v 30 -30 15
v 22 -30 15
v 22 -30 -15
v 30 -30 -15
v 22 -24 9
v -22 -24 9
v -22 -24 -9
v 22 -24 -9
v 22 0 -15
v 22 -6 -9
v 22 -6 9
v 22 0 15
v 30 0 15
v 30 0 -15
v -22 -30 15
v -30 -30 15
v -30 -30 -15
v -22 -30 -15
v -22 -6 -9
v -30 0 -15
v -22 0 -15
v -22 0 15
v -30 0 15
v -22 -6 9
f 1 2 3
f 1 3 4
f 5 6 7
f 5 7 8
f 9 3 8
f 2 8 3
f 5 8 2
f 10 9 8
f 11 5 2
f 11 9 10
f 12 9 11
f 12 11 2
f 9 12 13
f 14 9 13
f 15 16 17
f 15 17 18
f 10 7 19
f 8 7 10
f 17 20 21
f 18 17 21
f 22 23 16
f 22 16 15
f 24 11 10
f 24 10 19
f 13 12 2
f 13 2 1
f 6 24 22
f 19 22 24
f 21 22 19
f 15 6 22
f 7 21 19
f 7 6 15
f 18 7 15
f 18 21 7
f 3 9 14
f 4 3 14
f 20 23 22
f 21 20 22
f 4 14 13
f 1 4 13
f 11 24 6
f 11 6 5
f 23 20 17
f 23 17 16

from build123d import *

# Parameters (mm, degrees)
F0_W     = 60
F0_H     = 30
F1_DEPTH = 30
F2_W     = 44
F2_H     = 30
F3_DEPTH = 6
F4_W     = 44
F4_H     = 24
F5_DEPTH = 6
F6_W     = 44
F6_H     = 24
F7_DEPTH = 6
F8_W     = 44
F8_H     = 18
F9_DEPTH = 6


with BuildPart() as f1:
    # F0 (on Front) → F1 (new body)
    with BuildSketch(Plane.XZ):
        Rectangle(F0_W, F0_H)
    extrude(amount=F1_DEPTH)

    # F2 (on face) → F3 (cut)
    with BuildSketch(Plane.XZ.offset(30)):
        Rectangle(F2_W, F2_H)
    extrude(amount=-F3_DEPTH, mode=Mode.SUBTRACT)

    # F4 (on face) → F5 (cut)
    with BuildSketch(Plane(origin=(0, 0, -15), x_dir=(1, 0, 0), z_dir=(0, 0, -1))):
        with Locations((0, 12)):
            Rectangle(F4_W, F4_H)
    extrude(amount=-F5_DEPTH, mode=Mode.SUBTRACT)

    # F6 (on face) → F7 (cut)
    with BuildSketch(Plane(origin=(0, 0, 0), x_dir=(-1, 0, 0), z_dir=(0, 1, 0))):
        with Locations((0, 3)):
            Rectangle(F6_W, F6_H)
    extrude(amount=-F7_DEPTH, mode=Mode.SUBTRACT)

    # F8 (on face) → F9 (cut)
    with BuildSketch(Plane.XY.offset(15)):
        with Locations((0, -15)):
            Rectangle(F8_W, F8_H)
    extrude(amount=-F9_DEPTH, mode=Mode.SUBTRACT)


solid = f1.part
